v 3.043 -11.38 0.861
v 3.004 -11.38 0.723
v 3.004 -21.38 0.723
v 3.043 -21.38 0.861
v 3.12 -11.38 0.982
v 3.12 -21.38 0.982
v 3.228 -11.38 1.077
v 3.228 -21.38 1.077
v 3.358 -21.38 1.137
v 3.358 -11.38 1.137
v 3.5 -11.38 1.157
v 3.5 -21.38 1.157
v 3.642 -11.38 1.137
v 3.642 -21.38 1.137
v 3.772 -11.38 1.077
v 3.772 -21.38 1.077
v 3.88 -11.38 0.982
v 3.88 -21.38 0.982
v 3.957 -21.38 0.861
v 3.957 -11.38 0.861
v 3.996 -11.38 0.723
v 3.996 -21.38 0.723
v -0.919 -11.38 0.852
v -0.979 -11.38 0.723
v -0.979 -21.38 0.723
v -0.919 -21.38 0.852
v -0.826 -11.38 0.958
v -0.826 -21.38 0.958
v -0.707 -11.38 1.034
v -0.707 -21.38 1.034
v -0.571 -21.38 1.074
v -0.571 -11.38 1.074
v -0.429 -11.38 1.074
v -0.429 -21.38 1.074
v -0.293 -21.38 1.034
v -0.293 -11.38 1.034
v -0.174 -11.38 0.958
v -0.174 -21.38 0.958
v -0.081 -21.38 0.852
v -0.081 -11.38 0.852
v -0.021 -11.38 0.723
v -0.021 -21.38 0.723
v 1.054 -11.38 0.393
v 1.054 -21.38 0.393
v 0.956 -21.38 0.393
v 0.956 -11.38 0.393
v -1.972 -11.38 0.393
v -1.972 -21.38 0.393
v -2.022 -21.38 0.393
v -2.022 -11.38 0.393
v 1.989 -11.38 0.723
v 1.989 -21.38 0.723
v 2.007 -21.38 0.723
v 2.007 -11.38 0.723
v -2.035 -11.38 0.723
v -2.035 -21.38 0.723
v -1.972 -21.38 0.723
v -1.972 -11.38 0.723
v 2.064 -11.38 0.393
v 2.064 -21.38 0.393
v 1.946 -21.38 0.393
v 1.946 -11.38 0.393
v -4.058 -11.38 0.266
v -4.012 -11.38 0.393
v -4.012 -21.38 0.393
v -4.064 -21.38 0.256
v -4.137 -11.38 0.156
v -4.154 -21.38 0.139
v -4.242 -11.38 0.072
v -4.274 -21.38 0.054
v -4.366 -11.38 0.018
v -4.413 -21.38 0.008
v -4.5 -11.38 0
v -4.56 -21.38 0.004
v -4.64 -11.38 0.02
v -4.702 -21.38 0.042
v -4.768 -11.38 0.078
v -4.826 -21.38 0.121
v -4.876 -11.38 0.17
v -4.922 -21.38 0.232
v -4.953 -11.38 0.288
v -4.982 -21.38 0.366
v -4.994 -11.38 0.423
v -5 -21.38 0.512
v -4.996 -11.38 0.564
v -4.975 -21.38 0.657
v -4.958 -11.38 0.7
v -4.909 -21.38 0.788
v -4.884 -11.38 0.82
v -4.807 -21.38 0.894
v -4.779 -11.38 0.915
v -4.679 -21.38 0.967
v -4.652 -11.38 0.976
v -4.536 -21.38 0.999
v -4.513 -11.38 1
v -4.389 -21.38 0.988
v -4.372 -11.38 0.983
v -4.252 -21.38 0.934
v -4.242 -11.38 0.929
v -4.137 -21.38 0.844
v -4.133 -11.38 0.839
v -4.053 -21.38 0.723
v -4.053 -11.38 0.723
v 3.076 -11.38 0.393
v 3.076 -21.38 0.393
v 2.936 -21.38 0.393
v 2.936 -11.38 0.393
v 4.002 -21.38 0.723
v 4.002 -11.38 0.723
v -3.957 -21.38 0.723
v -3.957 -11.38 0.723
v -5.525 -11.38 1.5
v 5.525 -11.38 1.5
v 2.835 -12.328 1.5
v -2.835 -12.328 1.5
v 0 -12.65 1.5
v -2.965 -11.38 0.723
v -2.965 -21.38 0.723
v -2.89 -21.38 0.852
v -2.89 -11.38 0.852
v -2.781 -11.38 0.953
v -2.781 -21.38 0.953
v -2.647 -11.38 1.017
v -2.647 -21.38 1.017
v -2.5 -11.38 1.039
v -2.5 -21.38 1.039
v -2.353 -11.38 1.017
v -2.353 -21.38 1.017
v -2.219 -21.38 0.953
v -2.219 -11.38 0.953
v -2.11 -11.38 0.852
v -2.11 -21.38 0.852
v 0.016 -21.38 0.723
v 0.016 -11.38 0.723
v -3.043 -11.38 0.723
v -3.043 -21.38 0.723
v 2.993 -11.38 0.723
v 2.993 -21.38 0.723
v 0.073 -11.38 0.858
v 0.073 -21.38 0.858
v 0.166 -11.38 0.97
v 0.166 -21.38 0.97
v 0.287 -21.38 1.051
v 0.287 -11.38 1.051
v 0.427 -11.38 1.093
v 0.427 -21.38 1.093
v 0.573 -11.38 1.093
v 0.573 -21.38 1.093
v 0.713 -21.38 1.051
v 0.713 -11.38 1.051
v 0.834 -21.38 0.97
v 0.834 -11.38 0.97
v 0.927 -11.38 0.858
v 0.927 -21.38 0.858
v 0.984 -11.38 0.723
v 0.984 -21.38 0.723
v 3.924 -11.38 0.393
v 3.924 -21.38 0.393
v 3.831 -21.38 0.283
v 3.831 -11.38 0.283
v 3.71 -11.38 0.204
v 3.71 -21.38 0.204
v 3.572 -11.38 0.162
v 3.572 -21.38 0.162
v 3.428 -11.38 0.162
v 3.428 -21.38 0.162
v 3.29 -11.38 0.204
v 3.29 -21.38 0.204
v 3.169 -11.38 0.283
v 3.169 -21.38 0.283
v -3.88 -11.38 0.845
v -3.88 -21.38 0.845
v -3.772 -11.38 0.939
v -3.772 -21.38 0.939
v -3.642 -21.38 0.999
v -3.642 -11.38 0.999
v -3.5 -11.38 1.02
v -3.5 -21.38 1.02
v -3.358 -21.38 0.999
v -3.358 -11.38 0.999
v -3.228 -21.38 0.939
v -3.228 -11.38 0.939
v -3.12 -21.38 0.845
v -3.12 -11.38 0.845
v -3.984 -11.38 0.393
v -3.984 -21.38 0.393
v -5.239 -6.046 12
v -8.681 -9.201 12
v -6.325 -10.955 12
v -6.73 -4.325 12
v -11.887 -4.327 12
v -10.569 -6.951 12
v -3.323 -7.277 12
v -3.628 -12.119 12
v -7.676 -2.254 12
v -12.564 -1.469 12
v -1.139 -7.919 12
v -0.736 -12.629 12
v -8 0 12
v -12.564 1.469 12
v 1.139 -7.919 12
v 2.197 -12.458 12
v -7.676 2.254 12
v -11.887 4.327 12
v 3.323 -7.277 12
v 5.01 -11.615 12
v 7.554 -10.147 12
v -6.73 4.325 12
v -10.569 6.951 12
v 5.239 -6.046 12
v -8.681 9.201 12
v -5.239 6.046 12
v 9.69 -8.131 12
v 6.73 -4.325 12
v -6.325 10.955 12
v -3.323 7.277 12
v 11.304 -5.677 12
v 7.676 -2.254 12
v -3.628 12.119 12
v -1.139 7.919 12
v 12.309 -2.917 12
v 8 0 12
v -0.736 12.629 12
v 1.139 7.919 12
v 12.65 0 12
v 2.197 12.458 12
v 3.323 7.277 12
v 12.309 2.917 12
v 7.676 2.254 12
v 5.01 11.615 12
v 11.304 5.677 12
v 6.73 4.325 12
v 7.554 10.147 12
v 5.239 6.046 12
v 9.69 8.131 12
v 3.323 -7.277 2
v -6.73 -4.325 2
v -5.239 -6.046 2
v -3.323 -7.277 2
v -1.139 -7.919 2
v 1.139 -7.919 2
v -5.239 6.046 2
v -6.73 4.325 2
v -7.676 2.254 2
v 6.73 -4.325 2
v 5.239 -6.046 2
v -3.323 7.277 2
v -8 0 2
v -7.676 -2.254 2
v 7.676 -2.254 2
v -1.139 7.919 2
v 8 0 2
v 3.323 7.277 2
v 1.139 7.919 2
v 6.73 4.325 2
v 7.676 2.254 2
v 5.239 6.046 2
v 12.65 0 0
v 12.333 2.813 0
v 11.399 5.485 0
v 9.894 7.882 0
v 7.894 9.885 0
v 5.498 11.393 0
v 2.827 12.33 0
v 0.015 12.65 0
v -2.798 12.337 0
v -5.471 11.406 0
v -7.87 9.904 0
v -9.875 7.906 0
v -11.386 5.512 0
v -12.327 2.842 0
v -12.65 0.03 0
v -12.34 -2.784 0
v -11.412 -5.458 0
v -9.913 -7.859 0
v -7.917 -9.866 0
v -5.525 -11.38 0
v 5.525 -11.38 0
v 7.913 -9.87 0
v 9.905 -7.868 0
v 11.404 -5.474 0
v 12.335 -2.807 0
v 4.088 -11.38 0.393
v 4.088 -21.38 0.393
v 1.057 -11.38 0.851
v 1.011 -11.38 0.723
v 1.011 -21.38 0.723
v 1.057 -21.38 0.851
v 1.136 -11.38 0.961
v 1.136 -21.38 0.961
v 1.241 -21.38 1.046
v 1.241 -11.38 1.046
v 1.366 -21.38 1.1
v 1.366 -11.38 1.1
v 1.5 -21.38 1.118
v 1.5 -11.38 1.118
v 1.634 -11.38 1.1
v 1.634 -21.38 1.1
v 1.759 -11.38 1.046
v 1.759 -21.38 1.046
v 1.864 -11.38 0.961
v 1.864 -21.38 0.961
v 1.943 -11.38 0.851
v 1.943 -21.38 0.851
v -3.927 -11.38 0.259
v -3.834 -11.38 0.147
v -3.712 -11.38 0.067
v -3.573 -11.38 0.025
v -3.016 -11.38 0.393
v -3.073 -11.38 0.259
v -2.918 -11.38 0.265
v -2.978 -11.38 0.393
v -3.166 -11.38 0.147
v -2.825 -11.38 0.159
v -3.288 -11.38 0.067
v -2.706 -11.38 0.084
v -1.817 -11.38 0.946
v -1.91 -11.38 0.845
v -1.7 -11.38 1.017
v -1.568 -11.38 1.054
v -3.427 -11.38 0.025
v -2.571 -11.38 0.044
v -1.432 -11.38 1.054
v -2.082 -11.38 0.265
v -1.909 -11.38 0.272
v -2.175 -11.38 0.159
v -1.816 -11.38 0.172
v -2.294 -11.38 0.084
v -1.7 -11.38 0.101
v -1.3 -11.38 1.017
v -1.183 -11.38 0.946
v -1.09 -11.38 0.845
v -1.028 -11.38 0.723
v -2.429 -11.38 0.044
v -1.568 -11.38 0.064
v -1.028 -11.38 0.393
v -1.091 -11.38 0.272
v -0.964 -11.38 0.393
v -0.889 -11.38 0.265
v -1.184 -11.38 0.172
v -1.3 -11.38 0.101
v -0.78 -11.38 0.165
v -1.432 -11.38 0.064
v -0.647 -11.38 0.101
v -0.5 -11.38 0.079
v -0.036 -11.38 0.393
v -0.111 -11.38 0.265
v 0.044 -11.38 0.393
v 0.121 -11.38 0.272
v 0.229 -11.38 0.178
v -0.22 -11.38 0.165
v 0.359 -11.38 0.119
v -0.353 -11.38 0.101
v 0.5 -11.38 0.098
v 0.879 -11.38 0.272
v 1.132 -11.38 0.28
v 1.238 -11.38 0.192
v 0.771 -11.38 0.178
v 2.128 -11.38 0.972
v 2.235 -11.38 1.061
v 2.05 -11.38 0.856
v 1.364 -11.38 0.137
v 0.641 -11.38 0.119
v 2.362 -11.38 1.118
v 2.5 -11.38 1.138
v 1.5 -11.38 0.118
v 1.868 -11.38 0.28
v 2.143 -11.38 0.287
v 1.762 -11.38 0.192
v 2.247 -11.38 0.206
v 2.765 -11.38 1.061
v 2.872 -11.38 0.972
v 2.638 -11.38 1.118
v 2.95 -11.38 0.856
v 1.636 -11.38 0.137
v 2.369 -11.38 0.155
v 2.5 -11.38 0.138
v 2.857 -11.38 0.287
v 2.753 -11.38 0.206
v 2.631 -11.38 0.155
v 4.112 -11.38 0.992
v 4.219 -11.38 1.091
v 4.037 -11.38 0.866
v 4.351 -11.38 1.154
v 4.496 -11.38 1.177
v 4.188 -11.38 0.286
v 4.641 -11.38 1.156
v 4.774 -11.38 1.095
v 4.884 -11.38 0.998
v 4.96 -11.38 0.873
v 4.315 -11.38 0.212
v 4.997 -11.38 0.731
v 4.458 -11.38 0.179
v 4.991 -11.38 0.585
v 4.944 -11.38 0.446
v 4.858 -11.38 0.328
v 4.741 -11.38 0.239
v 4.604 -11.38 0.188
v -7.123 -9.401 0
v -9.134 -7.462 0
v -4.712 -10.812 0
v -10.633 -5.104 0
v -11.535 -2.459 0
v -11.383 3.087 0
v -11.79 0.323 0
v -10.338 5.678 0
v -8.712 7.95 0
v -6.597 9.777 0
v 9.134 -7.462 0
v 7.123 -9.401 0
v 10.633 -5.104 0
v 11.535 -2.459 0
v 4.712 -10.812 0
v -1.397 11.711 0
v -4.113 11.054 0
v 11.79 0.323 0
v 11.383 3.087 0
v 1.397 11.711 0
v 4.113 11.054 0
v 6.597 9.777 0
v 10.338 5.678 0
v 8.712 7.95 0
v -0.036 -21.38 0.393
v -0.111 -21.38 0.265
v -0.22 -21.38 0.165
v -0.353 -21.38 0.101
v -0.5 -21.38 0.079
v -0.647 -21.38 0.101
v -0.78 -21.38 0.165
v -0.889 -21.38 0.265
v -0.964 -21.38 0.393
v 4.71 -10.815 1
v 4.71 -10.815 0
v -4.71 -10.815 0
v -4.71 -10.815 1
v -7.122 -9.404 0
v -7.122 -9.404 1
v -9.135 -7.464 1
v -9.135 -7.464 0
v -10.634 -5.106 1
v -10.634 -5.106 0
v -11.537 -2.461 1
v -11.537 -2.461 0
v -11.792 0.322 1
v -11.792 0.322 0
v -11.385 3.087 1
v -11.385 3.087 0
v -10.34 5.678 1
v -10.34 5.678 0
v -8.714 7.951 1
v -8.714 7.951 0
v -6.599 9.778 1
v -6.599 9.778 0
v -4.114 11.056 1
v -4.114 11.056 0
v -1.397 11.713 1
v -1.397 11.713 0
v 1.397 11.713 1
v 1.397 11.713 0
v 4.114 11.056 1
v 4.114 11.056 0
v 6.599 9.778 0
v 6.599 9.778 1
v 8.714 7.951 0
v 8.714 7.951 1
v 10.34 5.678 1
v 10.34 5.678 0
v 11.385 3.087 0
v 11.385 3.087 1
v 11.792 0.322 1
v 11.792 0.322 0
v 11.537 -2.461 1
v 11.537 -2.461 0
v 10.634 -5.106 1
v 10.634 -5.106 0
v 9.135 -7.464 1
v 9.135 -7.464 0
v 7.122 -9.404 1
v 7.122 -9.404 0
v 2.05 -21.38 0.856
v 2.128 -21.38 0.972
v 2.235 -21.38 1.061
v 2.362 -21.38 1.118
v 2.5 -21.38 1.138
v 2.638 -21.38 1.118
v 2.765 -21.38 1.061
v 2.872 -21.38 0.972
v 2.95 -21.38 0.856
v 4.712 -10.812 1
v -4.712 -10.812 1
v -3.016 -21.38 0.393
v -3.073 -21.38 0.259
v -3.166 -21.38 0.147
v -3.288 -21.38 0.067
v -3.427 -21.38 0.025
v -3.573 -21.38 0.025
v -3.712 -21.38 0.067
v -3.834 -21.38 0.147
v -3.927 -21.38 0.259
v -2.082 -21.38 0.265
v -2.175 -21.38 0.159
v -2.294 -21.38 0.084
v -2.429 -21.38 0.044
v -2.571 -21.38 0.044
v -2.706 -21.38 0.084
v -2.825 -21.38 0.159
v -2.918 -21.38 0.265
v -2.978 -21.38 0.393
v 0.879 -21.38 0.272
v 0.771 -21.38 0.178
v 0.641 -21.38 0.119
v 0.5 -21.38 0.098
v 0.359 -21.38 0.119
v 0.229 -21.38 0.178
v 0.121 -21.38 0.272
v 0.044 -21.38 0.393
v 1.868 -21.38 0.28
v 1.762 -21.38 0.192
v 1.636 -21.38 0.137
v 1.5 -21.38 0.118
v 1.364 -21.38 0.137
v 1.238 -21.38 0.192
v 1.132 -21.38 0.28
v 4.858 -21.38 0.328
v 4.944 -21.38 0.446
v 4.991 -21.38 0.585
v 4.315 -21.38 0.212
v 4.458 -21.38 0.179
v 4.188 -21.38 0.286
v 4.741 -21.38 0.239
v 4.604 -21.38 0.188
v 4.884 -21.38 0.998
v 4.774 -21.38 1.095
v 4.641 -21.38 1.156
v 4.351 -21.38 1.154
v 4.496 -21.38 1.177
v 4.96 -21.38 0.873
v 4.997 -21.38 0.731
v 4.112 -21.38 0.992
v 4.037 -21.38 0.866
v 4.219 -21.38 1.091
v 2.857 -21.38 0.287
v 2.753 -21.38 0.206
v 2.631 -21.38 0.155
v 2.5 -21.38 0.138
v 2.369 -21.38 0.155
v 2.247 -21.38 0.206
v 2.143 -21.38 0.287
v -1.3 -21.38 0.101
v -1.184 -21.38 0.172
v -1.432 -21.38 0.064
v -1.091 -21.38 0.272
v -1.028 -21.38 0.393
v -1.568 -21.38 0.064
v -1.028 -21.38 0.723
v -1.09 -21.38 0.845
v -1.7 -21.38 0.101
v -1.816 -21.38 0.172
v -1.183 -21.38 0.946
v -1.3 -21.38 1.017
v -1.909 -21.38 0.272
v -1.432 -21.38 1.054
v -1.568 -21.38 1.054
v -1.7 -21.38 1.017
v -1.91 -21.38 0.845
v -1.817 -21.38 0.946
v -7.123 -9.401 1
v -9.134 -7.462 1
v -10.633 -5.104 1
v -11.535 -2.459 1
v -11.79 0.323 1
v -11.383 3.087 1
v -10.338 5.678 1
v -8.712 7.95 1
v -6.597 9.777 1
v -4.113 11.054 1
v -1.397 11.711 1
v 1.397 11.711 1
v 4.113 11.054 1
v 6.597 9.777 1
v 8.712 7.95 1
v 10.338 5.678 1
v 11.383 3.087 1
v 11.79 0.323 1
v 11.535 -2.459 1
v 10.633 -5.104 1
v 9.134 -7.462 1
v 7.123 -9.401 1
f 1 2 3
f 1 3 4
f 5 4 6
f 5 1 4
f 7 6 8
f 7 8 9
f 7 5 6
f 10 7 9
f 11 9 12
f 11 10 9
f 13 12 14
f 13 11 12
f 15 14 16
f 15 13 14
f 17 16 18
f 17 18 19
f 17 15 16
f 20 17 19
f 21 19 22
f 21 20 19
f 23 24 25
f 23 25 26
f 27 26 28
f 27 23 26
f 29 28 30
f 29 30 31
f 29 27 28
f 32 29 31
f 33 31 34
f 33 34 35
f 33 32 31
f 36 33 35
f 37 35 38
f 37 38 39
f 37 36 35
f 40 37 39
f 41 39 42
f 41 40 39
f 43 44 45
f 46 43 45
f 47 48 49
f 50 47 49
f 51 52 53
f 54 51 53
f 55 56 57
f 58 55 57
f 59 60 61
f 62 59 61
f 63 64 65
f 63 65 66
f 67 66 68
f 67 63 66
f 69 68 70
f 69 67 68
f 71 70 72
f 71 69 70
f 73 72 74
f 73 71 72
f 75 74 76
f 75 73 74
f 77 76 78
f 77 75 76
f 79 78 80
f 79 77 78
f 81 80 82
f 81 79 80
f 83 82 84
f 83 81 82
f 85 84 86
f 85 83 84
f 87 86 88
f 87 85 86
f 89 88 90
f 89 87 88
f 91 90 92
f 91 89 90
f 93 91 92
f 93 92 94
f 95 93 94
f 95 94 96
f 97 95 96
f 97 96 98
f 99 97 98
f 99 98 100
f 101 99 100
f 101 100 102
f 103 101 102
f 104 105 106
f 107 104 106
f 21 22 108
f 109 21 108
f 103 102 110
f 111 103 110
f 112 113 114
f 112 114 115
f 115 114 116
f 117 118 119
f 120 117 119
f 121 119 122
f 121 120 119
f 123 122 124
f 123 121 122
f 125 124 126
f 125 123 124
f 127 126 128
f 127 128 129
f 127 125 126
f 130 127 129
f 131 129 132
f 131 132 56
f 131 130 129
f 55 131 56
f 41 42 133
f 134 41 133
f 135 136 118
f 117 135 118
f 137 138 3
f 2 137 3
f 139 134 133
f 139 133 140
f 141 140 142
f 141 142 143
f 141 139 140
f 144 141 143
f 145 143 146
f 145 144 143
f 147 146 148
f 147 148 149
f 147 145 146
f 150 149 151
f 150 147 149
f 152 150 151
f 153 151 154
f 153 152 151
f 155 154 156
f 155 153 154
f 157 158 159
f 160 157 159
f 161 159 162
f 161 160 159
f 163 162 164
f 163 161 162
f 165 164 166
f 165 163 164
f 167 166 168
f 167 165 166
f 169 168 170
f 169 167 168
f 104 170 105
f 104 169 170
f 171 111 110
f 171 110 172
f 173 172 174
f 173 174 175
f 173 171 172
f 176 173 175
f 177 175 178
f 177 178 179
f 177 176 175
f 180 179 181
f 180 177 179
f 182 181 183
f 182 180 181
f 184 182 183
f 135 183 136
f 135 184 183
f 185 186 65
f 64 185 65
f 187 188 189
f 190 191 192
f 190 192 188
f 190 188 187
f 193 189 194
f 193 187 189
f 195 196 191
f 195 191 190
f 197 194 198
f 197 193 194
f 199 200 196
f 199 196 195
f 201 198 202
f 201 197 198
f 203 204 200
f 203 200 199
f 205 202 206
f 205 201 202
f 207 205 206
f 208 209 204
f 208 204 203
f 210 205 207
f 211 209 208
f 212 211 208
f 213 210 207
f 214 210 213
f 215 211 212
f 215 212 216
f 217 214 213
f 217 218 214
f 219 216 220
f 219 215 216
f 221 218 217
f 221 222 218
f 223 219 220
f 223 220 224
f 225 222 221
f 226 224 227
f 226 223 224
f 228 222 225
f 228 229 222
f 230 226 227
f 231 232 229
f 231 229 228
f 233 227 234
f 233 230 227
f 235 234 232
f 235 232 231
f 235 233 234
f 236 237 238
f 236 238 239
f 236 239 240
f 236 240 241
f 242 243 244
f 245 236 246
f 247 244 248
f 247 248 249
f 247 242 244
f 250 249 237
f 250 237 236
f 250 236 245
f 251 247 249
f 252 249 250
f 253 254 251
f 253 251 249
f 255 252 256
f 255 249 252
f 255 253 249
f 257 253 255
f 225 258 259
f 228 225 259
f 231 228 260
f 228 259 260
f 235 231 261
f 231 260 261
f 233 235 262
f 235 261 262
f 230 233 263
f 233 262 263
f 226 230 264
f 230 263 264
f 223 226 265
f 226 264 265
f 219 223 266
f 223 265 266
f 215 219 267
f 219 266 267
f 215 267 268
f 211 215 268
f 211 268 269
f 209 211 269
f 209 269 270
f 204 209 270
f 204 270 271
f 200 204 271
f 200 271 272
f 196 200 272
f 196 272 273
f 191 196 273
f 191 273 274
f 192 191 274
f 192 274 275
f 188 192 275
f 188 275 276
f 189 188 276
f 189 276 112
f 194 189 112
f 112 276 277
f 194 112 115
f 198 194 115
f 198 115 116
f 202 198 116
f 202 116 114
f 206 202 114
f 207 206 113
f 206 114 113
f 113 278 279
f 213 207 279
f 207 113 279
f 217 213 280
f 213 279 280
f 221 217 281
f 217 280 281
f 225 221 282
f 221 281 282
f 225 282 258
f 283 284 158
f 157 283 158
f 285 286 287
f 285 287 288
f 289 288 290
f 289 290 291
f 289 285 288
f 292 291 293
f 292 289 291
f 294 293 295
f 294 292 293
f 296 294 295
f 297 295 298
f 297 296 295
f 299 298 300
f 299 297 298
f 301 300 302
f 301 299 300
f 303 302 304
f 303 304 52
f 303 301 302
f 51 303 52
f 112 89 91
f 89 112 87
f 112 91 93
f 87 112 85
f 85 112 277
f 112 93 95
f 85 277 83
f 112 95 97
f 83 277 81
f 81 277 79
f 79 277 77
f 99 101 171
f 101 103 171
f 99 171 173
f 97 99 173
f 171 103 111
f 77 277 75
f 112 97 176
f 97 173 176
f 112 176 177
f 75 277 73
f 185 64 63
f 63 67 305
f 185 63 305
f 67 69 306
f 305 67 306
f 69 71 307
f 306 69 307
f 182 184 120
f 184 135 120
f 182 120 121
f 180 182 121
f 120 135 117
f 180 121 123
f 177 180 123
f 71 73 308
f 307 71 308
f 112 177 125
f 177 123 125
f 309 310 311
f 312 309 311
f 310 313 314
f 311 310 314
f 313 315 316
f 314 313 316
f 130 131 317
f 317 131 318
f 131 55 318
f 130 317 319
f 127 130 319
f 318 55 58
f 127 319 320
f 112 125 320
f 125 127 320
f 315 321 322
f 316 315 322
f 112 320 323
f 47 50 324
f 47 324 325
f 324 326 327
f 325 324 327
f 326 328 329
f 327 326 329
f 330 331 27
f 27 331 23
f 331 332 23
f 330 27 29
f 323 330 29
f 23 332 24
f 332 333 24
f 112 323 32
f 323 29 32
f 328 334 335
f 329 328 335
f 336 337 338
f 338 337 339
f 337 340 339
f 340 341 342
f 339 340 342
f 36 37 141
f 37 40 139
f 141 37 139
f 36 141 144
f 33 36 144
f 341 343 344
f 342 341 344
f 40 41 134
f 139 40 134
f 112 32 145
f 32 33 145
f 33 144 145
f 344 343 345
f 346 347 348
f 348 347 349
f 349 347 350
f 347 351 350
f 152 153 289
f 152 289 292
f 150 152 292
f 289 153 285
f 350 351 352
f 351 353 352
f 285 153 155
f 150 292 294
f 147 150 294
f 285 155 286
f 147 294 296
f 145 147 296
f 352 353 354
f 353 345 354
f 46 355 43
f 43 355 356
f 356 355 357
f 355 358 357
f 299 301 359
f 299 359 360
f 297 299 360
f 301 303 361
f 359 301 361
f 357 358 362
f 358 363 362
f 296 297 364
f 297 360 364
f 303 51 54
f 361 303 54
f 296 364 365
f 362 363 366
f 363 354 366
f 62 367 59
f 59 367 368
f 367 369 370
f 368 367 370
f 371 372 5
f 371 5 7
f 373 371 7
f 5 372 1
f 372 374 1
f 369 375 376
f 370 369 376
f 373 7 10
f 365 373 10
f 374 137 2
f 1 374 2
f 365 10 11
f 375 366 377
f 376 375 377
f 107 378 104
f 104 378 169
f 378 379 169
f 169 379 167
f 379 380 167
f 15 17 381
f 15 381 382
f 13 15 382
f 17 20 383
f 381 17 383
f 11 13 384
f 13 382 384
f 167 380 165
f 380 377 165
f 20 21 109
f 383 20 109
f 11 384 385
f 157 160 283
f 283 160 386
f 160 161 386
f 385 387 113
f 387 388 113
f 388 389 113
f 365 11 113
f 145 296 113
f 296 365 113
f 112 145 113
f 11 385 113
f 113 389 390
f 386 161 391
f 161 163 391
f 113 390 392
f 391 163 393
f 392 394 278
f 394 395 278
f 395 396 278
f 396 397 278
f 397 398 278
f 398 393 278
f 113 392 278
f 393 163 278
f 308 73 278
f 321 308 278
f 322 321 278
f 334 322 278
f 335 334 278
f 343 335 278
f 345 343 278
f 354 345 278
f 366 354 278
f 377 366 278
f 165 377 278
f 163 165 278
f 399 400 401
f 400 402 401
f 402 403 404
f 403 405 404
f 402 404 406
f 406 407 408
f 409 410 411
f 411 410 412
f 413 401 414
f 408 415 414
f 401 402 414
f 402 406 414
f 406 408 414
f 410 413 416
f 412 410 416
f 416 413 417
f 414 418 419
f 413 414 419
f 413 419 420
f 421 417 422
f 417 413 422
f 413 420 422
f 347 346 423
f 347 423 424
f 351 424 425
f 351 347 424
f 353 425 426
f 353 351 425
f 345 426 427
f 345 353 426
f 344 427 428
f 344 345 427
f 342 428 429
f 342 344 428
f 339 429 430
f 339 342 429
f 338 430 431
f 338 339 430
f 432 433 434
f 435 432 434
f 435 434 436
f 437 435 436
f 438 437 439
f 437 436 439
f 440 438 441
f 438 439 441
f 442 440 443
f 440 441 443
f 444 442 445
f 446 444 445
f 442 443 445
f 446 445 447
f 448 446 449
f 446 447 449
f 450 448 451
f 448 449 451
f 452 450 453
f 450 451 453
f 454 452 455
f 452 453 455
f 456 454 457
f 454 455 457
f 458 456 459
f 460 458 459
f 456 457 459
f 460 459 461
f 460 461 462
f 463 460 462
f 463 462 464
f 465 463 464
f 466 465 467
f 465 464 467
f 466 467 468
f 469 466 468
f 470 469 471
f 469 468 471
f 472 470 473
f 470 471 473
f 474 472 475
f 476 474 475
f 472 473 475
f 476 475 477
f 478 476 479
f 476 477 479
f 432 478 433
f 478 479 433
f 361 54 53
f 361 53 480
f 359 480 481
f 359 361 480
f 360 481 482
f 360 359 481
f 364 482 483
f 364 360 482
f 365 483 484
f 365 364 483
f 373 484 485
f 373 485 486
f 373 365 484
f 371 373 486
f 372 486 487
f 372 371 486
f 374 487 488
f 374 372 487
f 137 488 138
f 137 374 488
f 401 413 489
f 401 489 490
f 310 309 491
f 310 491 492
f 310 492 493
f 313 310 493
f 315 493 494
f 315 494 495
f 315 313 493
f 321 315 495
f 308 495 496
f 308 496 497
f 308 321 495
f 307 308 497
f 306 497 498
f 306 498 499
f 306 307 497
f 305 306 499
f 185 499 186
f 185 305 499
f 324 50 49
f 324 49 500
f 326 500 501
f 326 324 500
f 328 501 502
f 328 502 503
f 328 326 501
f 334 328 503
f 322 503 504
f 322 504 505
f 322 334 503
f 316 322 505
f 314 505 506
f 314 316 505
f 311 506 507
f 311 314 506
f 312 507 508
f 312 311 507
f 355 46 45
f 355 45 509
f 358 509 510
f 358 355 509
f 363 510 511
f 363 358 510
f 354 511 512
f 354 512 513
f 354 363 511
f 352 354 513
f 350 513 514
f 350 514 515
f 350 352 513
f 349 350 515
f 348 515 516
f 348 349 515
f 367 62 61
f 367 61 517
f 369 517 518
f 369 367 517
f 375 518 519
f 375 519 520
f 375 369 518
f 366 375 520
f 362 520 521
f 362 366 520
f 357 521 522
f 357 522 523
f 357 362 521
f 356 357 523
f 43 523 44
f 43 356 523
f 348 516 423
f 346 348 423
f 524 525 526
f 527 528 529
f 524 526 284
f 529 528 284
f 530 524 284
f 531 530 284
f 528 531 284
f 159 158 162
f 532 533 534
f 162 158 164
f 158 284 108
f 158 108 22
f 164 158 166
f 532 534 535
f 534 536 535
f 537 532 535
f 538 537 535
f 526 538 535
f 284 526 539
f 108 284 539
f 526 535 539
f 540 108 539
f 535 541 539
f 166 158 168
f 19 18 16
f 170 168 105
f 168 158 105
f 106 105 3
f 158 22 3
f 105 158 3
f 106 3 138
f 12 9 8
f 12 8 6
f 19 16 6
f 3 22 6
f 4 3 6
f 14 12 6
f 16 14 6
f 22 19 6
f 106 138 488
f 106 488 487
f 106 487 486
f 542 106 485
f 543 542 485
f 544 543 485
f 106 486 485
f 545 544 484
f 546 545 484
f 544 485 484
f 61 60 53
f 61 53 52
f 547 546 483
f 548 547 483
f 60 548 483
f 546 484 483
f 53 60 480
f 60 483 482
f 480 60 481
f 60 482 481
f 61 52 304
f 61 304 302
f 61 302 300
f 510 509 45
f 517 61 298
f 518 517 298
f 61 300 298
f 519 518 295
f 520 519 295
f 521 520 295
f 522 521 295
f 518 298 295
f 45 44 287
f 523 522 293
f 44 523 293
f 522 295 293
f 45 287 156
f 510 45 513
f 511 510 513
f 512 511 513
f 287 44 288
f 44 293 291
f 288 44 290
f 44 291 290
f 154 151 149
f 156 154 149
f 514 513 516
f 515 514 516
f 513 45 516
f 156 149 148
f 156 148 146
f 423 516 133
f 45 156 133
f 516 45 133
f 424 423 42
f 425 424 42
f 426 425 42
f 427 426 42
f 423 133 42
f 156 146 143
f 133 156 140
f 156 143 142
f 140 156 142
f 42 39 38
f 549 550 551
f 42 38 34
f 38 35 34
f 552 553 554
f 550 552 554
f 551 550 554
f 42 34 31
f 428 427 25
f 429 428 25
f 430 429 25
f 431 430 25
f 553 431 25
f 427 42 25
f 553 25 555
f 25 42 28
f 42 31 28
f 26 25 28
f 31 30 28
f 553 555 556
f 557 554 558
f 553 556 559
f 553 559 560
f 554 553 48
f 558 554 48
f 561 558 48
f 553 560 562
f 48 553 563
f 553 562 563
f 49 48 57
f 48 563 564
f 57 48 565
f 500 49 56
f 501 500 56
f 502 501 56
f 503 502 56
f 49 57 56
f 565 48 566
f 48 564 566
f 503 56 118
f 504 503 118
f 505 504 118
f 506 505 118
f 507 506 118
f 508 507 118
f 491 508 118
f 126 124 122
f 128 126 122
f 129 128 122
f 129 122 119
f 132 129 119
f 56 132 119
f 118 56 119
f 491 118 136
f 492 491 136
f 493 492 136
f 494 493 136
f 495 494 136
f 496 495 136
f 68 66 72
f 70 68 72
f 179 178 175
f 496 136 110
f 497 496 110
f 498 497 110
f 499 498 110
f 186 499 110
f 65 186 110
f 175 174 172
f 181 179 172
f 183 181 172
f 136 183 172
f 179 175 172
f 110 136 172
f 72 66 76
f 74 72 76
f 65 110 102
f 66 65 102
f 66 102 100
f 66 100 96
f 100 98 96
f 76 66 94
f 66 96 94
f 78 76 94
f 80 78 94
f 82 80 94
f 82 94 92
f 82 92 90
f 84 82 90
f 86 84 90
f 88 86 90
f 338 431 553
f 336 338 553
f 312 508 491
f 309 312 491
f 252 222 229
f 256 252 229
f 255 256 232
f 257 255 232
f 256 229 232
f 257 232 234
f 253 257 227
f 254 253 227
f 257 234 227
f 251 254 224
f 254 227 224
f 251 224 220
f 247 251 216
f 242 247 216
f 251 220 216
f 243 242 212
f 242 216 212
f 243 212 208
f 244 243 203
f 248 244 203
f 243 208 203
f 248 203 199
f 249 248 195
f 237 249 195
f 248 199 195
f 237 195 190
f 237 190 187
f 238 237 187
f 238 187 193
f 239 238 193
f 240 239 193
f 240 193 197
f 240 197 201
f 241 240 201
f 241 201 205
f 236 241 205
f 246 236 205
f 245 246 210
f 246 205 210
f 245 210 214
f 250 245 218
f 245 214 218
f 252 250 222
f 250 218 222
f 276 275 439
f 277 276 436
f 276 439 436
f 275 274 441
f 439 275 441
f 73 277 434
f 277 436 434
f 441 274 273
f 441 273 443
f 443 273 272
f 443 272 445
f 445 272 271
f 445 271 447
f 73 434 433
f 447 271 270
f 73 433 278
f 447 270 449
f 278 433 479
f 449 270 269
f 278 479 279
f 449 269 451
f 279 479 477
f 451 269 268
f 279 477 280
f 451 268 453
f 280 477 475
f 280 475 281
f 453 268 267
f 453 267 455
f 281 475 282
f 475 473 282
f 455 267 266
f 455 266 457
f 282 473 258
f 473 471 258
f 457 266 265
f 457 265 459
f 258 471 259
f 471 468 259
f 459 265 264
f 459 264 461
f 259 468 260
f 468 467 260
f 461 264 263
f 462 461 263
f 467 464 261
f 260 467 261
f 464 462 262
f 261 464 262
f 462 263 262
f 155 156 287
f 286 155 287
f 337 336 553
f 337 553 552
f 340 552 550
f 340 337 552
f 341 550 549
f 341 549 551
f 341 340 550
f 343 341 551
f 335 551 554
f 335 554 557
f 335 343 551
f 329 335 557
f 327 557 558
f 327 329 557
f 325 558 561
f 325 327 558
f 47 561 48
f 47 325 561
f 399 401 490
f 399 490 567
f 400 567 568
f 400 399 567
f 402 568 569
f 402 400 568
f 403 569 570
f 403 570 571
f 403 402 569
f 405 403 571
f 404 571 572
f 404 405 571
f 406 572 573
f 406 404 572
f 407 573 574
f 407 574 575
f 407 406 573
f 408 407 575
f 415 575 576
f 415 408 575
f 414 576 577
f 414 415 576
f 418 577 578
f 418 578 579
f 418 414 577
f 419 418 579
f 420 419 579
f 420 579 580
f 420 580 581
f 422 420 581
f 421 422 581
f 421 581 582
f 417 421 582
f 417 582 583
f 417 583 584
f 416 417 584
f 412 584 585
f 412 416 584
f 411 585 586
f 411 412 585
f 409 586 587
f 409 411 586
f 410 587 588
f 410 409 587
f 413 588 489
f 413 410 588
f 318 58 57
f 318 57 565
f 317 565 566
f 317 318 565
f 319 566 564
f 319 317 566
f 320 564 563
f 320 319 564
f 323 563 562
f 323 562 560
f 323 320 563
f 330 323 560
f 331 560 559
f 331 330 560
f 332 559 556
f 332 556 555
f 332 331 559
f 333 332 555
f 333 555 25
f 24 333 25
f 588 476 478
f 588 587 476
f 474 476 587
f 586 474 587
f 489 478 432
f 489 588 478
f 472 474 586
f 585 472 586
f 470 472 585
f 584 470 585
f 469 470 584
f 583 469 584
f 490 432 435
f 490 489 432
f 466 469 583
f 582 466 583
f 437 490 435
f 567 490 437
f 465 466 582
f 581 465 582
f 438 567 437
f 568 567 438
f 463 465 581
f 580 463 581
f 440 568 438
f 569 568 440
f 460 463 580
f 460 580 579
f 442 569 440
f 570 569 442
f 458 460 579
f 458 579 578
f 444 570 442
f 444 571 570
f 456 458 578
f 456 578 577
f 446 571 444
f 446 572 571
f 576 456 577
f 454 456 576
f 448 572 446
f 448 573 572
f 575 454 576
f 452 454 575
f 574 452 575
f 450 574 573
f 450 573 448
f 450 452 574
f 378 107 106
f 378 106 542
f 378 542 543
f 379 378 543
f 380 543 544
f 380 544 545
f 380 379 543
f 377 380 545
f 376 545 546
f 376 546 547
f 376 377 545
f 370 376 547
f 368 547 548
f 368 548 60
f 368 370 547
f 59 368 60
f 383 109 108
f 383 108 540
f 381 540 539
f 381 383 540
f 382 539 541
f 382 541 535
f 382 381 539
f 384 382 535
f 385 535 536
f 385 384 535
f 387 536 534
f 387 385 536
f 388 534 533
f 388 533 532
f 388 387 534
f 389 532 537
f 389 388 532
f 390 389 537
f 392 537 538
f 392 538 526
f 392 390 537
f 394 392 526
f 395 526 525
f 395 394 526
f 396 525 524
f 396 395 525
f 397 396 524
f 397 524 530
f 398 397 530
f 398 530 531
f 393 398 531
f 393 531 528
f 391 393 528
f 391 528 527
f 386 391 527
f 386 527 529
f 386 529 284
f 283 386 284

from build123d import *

# Parameters (mm, degrees)
SKETCH_1_R          = 12.65
EXTRUDE_1_DEPTH     = 12
CUT_EXTRUDE_START   = 9
CUT_EXTRUDE_1_DEPTH = 9
CUT_EXTRUDE_2_DEPTH = 0.5
EXTRUDE_5_DEPTH     = 10
SKETCH_4_R          = 8
CUT_EXTRUDE_3_DEPTH = 10
CUT_EXTRUDE_4_DEPTH = 1


with BuildPart() as part:
    # 草图1 → 凸台-拉伸1 (new body)
    with BuildSketch(Plane.XY):
        Circle(SKETCH_1_R)
    extrude(amount=EXTRUDE_1_DEPTH)

    # 草图2 → 切除-拉伸1 (cut)
    with BuildSketch(Plane(origin=(0, 0, 1), x_dir=(-1, 0, 0), z_dir=(0, 0, -1)).offset(CUT_EXTRUDE_START)):
        with BuildLine():
            Line((0, -11.379520841), (-5.525305913, -11.379520841))
            ThreePointArc((-5.525305913, -11.379520841), (0, -12.65), (5.525305913, -11.379520841))
            Line((5.525305913, -11.379520841), (0, -11.379520841))
        make_face()
    extrude(amount=-CUT_EXTRUDE_1_DEPTH, mode=Mode.SUBTRACT)

    # 草图2<2> → 切除-拉伸2 (cut)
    with BuildSketch(Plane(origin=(0, 0, 1), x_dir=(-1, 0, 0), z_dir=(0, 0, -1))):
        with BuildLine():
            Line((0, -11.379520841), (-5.525305913, -11.379520841))
            ThreePointArc((-5.525305913, -11.379520841), (0, -12.65), (5.525305913, -11.379520841))
            Line((5.525305913, -11.379520841), (0, -11.379520841))
        make_face()
    extrude(amount=-CUT_EXTRUDE_2_DEPTH, mode=Mode.SUBTRACT)

    # 草图3 → 凸台-拉伸5 (add)
    with BuildSketch(Plane.XZ.offset(11.379520841)):
        with BuildLine():
            Line((-4.052610832, 0.723255308), (-3.95666659, 0.723255308))
            ThreePointArc((-3.95666659, 0.723255308), (-3.5, 1.019648763), (-3.04333341, 0.723255308))
            Line((-3.04333341, 0.723255308), (-2.964929601, 0.723255308))
            ThreePointArc((-2.964929601, 0.723255308), (-2.5, 1.039297525), (-2.035070399, 0.723255308))
            Line((-2.035070399, 0.723255308), (-1.972231454, 0.723255308))
            ThreePointArc((-1.972231454, 0.723255308), (-1.5, 1.058946288), (-1.027768546, 0.723255308))
            Line((-1.027768546, 0.723255308), (-0.97861614, 0.723255308))
            ThreePointArc((-0.97861614, 0.723255308), (-0.5, 1.07859505), (-0.02138386, 0.723255308))
            Line((-0.02138386, 0.723255308), (0.01588005, 0.723255308))
            ThreePointArc((0.01588005, 0.723255308), (0.5, 1.098243813), (0.98411995, 0.723255308))
            Line((0.98411995, 0.723255308), (1.011227359, 0.723255308))
            ThreePointArc((1.011227359, 0.723255308), (1.5, 1.117892575), (1.988772641, 0.723255308))
            Line((1.988772641, 0.723255308), (2.007401669, 0.723255308))
            ThreePointArc((2.007401669, 0.723255308), (2.5, 1.137541338), (2.992598331, 0.723255308))
            Line((2.992598331, 0.723255308), (3.00438383, 0.723255308))
            ThreePointArc((3.00438383, 0.723255308), (3.5, 1.1571901), (3.99561617, 0.723255308))
            Line((3.99561617, 0.723255308), (4.002159148, 0.723255308))
            ThreePointArc((4.002159148, 0.723255308), (4.983765438, 0.803215289), (4.088469212, 0.392862789))
            Line((4.088469212, 0.392862789), (3.924418511, 0.392862789))
            ThreePointArc((3.924418511, 0.392862789), (3.5, 0.1571901), (3.075581489, 0.392862789))
            Line((3.075581489, 0.392862789), (2.93604175, 0.392862789))
            ThreePointArc((2.93604175, 0.392862789), (2.5, 0.137541338), (2.06395825, 0.392862789))
            Line((2.06395825, 0.392862789), (1.946499267, 0.392862789))
            ThreePointArc((1.946499267, 0.392862789), (1.5, 0.117892575), (1.053500733, 0.392862789))
            Line((1.053500733, 0.392862789), (0.955871292, 0.392862789))
            ThreePointArc((0.955871292, 0.392862789), (0.5, 0.098243813), (0.044128708, 0.392862789))
            Line((0.044128708, 0.392862789), (-0.035776425, 0.392862789))
            ThreePointArc((-0.035776425, 0.392862789), (-0.5, 0.07859505), (-0.964223575, 0.392862789))
            Line((-0.964223575, 0.392862789), (-1.028389704, 0.392862789))
            ThreePointArc((-1.028389704, 0.392862789), (-1.5, 0.058946288), (-1.971610296, 0.392862789))
            Line((-1.971610296, 0.392862789), (-2.021923784, 0.392862789))
            ThreePointArc((-2.021923784, 0.392862789), (-2.5, 0.039297525), (-2.978076216, 0.392862789))
            Line((-2.978076216, 0.392862789), (-3.016341735, 0.392862789))
            ThreePointArc((-3.016341735, 0.392862789), (-3.5, 0.019648763), (-3.983658265, 0.392862789))
            Line((-3.983658265, 0.392862789), (-4.01161325, 0.392862789))
            ThreePointArc((-4.01161325, 0.392862789), (-4.996194464, 0.438428468), (-4.052610832, 0.723255308))
        make_face()
    extrude(amount=EXTRUDE_5_DEPTH)

    # 草图4 → 切除-拉伸3 (cut)
    with BuildSketch(Plane.XY.offset(12)):
        Circle(SKETCH_4_R)
    extrude(amount=-CUT_EXTRUDE_3_DEPTH, mode=Mode.SUBTRACT)

    # 草图5 → 切除-拉伸4 (cut)
    with BuildSketch(Plane(origin=(0, 0, 0), x_dir=(-1, 0, 0), z_dir=(0, 0, -1))):
        with BuildLine():
            Line((-4.710329459, -10.815249292), (4.710329459, -10.815249292))
            ThreePointArc((4.710329459, -10.815249292), (0, 11.796474934), (-4.710329459, -10.815249292))
        make_face()
        with BuildLine():
            Line((-4.711523736, -10.812427627), (4.711523736, -10.812427627))
            ThreePointArc((4.711523736, -10.812427627), (0, 11.794365057), (-4.711523736, -10.812427627))
        make_face(mode=Mode.SUBTRACT)
    extrude(amount=-CUT_EXTRUDE_4_DEPTH, mode=Mode.SUBTRACT)


solid = part.part
